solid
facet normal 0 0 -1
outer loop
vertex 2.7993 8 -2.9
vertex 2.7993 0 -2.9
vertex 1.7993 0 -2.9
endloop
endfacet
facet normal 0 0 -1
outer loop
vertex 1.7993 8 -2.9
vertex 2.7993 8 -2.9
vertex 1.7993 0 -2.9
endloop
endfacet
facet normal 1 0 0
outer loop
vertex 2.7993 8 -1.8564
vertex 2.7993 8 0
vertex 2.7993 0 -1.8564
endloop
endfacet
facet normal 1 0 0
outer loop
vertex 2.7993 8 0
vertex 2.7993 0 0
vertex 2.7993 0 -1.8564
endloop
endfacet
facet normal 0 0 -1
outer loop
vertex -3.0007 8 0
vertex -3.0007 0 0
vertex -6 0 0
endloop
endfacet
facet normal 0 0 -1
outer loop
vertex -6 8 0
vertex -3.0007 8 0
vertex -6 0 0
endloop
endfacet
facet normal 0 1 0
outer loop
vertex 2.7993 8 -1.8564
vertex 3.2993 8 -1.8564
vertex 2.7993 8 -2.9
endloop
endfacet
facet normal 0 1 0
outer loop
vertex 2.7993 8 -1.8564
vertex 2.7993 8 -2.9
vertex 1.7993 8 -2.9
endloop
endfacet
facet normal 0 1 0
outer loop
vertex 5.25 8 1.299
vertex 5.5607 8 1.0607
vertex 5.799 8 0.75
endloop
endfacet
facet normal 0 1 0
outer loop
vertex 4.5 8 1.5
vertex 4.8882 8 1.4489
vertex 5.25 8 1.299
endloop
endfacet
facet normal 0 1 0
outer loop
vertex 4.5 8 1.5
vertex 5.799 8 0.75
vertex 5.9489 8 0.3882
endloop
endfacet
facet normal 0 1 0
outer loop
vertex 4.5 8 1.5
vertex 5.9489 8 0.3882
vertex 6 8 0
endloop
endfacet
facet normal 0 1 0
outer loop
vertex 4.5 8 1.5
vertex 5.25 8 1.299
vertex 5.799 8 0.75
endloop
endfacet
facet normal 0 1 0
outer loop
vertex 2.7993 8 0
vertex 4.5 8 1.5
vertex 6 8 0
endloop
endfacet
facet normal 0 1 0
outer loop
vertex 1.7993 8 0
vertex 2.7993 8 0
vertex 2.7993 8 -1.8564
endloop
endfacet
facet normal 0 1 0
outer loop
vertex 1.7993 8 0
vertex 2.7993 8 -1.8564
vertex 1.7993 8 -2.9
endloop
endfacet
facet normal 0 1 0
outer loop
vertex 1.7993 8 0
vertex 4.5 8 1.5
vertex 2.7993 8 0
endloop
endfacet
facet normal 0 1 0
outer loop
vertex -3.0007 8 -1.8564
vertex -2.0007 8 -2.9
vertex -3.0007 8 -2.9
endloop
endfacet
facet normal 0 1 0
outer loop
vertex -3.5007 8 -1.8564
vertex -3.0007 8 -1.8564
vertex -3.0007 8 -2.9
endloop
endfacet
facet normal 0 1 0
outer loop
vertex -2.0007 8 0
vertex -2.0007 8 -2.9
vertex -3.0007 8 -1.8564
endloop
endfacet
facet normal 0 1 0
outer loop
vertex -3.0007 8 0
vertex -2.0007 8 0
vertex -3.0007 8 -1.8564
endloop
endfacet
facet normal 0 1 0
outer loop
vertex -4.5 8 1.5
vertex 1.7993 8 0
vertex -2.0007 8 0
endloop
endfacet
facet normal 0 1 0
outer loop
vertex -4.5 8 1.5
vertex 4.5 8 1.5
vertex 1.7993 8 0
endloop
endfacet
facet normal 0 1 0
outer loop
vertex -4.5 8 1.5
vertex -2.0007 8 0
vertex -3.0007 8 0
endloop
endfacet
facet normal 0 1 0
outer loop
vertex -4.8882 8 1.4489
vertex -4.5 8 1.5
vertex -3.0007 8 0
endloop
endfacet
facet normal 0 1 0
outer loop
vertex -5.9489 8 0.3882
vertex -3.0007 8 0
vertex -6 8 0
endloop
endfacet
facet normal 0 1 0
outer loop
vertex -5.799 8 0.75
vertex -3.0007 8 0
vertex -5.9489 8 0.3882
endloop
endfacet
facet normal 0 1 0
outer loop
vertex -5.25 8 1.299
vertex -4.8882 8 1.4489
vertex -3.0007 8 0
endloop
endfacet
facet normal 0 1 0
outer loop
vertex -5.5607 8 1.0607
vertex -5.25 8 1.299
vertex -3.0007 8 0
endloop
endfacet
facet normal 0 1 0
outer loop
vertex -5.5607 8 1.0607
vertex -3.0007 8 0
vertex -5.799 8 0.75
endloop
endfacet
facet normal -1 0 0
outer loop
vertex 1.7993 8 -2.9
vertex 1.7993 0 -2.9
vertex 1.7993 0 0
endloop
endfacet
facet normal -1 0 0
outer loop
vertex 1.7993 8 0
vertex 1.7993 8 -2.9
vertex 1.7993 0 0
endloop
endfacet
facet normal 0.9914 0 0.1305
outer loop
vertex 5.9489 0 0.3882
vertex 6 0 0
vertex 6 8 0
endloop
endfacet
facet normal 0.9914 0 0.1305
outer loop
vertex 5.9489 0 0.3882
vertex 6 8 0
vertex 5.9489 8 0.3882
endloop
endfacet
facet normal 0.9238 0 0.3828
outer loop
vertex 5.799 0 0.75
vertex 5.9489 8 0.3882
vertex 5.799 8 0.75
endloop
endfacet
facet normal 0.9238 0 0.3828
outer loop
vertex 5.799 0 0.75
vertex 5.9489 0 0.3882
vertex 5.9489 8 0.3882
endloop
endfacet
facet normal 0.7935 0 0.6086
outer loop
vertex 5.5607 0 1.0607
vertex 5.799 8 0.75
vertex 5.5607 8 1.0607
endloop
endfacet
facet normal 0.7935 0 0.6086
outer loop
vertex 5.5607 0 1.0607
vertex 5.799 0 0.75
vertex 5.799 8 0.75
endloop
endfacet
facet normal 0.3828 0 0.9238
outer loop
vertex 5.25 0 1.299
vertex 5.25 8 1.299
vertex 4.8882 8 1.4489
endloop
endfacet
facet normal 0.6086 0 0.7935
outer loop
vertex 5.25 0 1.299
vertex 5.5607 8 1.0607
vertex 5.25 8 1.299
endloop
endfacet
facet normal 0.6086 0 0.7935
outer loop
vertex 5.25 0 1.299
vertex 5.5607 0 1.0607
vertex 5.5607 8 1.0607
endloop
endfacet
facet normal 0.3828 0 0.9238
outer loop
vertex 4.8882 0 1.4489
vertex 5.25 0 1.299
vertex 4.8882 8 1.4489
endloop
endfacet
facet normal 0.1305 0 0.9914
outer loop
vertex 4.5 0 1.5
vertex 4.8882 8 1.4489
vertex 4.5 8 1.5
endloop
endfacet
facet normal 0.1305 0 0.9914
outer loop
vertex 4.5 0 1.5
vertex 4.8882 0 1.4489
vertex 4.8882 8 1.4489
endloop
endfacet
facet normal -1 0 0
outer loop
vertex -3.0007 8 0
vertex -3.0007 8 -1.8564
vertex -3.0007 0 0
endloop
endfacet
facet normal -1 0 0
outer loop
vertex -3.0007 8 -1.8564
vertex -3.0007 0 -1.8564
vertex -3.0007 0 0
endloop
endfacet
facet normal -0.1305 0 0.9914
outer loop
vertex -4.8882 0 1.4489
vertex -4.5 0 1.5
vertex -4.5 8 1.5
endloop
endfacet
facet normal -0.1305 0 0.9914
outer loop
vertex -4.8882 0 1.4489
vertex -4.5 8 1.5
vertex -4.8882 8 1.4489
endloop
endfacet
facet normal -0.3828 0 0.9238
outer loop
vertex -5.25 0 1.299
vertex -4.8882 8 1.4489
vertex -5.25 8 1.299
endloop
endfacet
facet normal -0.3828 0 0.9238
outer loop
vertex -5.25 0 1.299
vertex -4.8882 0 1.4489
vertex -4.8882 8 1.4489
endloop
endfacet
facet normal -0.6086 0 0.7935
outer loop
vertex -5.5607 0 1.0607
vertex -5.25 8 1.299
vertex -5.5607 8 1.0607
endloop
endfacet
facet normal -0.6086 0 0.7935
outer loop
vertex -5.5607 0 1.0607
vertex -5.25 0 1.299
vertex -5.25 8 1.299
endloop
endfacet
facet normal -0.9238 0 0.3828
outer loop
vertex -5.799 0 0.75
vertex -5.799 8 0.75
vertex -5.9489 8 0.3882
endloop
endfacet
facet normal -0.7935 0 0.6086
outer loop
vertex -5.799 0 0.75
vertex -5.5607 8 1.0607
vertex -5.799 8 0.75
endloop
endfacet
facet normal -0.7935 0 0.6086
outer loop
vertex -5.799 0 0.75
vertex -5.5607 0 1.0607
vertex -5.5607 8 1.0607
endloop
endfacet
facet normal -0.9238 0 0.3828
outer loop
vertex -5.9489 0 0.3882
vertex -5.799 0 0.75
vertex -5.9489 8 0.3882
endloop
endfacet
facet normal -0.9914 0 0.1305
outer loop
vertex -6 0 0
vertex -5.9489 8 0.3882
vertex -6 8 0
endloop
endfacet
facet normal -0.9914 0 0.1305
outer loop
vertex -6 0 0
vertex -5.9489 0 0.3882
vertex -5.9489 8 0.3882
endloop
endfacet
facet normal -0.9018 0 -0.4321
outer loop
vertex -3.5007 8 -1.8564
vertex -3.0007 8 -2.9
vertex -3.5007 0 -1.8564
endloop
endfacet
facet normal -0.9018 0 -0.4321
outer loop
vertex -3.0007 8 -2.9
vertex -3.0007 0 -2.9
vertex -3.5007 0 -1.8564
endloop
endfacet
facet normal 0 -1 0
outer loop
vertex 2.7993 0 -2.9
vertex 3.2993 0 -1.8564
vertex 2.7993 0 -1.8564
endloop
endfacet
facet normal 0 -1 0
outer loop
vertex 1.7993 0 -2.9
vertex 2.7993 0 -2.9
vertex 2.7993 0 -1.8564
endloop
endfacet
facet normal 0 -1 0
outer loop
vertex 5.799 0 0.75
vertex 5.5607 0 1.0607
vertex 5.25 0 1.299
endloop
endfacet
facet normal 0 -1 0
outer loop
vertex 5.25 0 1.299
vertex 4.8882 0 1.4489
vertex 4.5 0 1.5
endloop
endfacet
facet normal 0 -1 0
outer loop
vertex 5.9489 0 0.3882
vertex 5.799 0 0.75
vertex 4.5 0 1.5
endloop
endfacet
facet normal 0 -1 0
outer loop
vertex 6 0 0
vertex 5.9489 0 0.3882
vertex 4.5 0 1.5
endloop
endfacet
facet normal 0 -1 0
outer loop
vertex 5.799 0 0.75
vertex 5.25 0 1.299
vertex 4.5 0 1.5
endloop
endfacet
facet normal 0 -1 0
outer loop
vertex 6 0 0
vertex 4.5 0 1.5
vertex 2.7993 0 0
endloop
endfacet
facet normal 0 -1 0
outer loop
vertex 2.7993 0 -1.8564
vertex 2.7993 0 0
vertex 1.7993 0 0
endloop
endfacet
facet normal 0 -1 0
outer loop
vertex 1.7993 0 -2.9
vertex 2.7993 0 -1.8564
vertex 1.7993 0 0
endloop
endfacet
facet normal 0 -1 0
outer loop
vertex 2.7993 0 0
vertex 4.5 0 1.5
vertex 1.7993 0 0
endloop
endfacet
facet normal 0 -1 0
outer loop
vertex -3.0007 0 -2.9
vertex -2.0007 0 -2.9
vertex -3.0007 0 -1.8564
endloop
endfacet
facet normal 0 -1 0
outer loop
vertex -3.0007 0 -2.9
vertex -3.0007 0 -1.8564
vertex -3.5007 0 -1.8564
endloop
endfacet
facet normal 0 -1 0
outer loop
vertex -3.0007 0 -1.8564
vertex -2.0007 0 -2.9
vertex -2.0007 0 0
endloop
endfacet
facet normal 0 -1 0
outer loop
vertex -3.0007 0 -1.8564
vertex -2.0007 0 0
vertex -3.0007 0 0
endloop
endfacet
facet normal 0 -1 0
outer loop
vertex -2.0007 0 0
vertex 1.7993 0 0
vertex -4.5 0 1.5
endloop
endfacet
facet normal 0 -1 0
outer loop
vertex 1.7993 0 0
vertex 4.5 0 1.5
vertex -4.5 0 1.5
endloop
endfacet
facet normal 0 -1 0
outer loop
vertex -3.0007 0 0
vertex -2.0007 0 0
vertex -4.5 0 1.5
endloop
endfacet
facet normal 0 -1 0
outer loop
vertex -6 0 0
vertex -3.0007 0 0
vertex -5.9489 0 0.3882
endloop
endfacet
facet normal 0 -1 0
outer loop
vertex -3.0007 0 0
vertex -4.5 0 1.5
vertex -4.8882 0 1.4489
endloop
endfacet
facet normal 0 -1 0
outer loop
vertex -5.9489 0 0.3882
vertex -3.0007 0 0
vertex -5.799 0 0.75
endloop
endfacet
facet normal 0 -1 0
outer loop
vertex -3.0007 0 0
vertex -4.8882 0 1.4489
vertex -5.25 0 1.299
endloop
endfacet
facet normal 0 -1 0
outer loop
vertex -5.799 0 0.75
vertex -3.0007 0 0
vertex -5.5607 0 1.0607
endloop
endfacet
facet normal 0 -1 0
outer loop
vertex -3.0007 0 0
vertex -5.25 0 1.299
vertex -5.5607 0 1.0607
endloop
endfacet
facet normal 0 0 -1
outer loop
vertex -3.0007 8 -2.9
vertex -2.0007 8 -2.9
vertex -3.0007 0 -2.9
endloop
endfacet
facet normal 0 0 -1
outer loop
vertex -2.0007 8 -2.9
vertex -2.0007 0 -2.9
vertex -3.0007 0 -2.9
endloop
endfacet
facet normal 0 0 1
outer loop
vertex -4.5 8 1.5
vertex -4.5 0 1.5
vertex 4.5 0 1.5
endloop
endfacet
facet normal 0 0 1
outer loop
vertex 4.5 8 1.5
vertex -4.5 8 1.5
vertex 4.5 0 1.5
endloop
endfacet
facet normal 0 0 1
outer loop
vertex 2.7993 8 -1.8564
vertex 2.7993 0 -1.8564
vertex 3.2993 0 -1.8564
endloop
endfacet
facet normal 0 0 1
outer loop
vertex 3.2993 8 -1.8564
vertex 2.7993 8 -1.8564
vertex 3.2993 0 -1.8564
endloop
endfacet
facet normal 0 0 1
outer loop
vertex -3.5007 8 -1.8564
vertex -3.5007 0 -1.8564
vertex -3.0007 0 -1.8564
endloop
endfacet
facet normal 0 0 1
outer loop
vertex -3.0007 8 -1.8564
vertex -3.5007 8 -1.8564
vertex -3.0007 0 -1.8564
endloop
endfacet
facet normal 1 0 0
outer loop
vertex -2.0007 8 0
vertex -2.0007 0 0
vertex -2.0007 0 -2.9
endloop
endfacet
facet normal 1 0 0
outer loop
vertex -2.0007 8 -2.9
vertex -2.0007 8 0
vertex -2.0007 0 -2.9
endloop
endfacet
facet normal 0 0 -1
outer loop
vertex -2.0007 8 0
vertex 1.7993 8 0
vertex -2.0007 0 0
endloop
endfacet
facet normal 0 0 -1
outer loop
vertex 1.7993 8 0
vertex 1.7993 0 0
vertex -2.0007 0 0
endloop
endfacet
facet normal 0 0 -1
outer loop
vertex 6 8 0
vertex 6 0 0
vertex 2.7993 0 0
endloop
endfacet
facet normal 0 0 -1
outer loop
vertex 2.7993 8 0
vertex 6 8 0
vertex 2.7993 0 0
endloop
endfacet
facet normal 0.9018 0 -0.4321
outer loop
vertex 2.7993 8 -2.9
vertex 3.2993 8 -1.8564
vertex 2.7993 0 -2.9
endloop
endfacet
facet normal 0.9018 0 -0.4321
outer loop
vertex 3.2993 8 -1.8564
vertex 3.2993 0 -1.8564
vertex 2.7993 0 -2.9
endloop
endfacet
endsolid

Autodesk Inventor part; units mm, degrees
ref_plane "YZ Plane" through (0, 0, 0) normal (1, 0, 0) x (0, 1, 0)
ref_plane "XZ Plane" through (0, 0, 0) normal (0, 1, 0) x (-1, 0, 0)
ref_plane "XY Plane" through (0, 0, 0) normal (0, 0, 1) x (1, 0, 0)
sketch "Skizze1" plane through (0, 0, 0) normal (0, 1, 0) x (-1, 0, 0)
  line L0 (-6, 0) -> (6, 0)
  arc A0 (-4.5, 1.5) -> (-6, 0) centre (-4.5, 0) ccw
  line L1 (4.5, 1.5) -> (-4.5, 1.5)
  arc A1 (6, 0) -> (4.5, 1.5) centre (4.5, 0) ccw
  line L2 (3.0007, -2.9) -> (3.0007, 0)
  line L3 (2.0007, 0) -> (2.0007, -2.9)
  line L4 (2.0007, -2.9) -> (3.0007, -2.9)
  line L5 (3.0007, -2.9) -> (3.5007, -1.8564)
  line L6 (3.5007, -1.8564) -> (3.0007, -1.8564)
  line L7 (-1.7993, -2.9) -> (-1.7993, 0)
  line L8 (-2.7993, 0) -> (-2.7993, -2.9)
  line L9 (-2.7993, -2.9) -> (-1.7993, -2.9)
  line L10 (-3.2993, -1.8564) -> (-2.7993, -2.9)
  line L11 (-2.7993, -1.8564) -> (-3.2993, -1.8564)
  point P0 (0, 0)
  point P1 (0, 0)
  dimension "d0" = 3
  dimension "d1" = 3
  dimension "d2" = 1
  dimension "d3" = 1
  dimension "d4" = 154.4
  dimension "d5" = 154.4
  dimension "d7" = 0.5
  dimension "d8" = 3.8
  dimension "d9" = 2.9
  dimension "d10" = 9
  dimension "d12" = 5.8
  dimension "d13" = 0.5
  dimension "d14" = 2.9
  dimension "d15" = 4.5
  dimension "d16" = 0
extrude "Extrusion1" add sketch "Skizze1" along normal blind 8
equation "\"d1\" = d0"
equation "\"d3\" = d2"
equation "\"d5\" = d4"
equation "\"d13\" = d7"
equation "\"d15\" = 0.5 * d10"
properties part number "Misumi_Cable_Clip"
